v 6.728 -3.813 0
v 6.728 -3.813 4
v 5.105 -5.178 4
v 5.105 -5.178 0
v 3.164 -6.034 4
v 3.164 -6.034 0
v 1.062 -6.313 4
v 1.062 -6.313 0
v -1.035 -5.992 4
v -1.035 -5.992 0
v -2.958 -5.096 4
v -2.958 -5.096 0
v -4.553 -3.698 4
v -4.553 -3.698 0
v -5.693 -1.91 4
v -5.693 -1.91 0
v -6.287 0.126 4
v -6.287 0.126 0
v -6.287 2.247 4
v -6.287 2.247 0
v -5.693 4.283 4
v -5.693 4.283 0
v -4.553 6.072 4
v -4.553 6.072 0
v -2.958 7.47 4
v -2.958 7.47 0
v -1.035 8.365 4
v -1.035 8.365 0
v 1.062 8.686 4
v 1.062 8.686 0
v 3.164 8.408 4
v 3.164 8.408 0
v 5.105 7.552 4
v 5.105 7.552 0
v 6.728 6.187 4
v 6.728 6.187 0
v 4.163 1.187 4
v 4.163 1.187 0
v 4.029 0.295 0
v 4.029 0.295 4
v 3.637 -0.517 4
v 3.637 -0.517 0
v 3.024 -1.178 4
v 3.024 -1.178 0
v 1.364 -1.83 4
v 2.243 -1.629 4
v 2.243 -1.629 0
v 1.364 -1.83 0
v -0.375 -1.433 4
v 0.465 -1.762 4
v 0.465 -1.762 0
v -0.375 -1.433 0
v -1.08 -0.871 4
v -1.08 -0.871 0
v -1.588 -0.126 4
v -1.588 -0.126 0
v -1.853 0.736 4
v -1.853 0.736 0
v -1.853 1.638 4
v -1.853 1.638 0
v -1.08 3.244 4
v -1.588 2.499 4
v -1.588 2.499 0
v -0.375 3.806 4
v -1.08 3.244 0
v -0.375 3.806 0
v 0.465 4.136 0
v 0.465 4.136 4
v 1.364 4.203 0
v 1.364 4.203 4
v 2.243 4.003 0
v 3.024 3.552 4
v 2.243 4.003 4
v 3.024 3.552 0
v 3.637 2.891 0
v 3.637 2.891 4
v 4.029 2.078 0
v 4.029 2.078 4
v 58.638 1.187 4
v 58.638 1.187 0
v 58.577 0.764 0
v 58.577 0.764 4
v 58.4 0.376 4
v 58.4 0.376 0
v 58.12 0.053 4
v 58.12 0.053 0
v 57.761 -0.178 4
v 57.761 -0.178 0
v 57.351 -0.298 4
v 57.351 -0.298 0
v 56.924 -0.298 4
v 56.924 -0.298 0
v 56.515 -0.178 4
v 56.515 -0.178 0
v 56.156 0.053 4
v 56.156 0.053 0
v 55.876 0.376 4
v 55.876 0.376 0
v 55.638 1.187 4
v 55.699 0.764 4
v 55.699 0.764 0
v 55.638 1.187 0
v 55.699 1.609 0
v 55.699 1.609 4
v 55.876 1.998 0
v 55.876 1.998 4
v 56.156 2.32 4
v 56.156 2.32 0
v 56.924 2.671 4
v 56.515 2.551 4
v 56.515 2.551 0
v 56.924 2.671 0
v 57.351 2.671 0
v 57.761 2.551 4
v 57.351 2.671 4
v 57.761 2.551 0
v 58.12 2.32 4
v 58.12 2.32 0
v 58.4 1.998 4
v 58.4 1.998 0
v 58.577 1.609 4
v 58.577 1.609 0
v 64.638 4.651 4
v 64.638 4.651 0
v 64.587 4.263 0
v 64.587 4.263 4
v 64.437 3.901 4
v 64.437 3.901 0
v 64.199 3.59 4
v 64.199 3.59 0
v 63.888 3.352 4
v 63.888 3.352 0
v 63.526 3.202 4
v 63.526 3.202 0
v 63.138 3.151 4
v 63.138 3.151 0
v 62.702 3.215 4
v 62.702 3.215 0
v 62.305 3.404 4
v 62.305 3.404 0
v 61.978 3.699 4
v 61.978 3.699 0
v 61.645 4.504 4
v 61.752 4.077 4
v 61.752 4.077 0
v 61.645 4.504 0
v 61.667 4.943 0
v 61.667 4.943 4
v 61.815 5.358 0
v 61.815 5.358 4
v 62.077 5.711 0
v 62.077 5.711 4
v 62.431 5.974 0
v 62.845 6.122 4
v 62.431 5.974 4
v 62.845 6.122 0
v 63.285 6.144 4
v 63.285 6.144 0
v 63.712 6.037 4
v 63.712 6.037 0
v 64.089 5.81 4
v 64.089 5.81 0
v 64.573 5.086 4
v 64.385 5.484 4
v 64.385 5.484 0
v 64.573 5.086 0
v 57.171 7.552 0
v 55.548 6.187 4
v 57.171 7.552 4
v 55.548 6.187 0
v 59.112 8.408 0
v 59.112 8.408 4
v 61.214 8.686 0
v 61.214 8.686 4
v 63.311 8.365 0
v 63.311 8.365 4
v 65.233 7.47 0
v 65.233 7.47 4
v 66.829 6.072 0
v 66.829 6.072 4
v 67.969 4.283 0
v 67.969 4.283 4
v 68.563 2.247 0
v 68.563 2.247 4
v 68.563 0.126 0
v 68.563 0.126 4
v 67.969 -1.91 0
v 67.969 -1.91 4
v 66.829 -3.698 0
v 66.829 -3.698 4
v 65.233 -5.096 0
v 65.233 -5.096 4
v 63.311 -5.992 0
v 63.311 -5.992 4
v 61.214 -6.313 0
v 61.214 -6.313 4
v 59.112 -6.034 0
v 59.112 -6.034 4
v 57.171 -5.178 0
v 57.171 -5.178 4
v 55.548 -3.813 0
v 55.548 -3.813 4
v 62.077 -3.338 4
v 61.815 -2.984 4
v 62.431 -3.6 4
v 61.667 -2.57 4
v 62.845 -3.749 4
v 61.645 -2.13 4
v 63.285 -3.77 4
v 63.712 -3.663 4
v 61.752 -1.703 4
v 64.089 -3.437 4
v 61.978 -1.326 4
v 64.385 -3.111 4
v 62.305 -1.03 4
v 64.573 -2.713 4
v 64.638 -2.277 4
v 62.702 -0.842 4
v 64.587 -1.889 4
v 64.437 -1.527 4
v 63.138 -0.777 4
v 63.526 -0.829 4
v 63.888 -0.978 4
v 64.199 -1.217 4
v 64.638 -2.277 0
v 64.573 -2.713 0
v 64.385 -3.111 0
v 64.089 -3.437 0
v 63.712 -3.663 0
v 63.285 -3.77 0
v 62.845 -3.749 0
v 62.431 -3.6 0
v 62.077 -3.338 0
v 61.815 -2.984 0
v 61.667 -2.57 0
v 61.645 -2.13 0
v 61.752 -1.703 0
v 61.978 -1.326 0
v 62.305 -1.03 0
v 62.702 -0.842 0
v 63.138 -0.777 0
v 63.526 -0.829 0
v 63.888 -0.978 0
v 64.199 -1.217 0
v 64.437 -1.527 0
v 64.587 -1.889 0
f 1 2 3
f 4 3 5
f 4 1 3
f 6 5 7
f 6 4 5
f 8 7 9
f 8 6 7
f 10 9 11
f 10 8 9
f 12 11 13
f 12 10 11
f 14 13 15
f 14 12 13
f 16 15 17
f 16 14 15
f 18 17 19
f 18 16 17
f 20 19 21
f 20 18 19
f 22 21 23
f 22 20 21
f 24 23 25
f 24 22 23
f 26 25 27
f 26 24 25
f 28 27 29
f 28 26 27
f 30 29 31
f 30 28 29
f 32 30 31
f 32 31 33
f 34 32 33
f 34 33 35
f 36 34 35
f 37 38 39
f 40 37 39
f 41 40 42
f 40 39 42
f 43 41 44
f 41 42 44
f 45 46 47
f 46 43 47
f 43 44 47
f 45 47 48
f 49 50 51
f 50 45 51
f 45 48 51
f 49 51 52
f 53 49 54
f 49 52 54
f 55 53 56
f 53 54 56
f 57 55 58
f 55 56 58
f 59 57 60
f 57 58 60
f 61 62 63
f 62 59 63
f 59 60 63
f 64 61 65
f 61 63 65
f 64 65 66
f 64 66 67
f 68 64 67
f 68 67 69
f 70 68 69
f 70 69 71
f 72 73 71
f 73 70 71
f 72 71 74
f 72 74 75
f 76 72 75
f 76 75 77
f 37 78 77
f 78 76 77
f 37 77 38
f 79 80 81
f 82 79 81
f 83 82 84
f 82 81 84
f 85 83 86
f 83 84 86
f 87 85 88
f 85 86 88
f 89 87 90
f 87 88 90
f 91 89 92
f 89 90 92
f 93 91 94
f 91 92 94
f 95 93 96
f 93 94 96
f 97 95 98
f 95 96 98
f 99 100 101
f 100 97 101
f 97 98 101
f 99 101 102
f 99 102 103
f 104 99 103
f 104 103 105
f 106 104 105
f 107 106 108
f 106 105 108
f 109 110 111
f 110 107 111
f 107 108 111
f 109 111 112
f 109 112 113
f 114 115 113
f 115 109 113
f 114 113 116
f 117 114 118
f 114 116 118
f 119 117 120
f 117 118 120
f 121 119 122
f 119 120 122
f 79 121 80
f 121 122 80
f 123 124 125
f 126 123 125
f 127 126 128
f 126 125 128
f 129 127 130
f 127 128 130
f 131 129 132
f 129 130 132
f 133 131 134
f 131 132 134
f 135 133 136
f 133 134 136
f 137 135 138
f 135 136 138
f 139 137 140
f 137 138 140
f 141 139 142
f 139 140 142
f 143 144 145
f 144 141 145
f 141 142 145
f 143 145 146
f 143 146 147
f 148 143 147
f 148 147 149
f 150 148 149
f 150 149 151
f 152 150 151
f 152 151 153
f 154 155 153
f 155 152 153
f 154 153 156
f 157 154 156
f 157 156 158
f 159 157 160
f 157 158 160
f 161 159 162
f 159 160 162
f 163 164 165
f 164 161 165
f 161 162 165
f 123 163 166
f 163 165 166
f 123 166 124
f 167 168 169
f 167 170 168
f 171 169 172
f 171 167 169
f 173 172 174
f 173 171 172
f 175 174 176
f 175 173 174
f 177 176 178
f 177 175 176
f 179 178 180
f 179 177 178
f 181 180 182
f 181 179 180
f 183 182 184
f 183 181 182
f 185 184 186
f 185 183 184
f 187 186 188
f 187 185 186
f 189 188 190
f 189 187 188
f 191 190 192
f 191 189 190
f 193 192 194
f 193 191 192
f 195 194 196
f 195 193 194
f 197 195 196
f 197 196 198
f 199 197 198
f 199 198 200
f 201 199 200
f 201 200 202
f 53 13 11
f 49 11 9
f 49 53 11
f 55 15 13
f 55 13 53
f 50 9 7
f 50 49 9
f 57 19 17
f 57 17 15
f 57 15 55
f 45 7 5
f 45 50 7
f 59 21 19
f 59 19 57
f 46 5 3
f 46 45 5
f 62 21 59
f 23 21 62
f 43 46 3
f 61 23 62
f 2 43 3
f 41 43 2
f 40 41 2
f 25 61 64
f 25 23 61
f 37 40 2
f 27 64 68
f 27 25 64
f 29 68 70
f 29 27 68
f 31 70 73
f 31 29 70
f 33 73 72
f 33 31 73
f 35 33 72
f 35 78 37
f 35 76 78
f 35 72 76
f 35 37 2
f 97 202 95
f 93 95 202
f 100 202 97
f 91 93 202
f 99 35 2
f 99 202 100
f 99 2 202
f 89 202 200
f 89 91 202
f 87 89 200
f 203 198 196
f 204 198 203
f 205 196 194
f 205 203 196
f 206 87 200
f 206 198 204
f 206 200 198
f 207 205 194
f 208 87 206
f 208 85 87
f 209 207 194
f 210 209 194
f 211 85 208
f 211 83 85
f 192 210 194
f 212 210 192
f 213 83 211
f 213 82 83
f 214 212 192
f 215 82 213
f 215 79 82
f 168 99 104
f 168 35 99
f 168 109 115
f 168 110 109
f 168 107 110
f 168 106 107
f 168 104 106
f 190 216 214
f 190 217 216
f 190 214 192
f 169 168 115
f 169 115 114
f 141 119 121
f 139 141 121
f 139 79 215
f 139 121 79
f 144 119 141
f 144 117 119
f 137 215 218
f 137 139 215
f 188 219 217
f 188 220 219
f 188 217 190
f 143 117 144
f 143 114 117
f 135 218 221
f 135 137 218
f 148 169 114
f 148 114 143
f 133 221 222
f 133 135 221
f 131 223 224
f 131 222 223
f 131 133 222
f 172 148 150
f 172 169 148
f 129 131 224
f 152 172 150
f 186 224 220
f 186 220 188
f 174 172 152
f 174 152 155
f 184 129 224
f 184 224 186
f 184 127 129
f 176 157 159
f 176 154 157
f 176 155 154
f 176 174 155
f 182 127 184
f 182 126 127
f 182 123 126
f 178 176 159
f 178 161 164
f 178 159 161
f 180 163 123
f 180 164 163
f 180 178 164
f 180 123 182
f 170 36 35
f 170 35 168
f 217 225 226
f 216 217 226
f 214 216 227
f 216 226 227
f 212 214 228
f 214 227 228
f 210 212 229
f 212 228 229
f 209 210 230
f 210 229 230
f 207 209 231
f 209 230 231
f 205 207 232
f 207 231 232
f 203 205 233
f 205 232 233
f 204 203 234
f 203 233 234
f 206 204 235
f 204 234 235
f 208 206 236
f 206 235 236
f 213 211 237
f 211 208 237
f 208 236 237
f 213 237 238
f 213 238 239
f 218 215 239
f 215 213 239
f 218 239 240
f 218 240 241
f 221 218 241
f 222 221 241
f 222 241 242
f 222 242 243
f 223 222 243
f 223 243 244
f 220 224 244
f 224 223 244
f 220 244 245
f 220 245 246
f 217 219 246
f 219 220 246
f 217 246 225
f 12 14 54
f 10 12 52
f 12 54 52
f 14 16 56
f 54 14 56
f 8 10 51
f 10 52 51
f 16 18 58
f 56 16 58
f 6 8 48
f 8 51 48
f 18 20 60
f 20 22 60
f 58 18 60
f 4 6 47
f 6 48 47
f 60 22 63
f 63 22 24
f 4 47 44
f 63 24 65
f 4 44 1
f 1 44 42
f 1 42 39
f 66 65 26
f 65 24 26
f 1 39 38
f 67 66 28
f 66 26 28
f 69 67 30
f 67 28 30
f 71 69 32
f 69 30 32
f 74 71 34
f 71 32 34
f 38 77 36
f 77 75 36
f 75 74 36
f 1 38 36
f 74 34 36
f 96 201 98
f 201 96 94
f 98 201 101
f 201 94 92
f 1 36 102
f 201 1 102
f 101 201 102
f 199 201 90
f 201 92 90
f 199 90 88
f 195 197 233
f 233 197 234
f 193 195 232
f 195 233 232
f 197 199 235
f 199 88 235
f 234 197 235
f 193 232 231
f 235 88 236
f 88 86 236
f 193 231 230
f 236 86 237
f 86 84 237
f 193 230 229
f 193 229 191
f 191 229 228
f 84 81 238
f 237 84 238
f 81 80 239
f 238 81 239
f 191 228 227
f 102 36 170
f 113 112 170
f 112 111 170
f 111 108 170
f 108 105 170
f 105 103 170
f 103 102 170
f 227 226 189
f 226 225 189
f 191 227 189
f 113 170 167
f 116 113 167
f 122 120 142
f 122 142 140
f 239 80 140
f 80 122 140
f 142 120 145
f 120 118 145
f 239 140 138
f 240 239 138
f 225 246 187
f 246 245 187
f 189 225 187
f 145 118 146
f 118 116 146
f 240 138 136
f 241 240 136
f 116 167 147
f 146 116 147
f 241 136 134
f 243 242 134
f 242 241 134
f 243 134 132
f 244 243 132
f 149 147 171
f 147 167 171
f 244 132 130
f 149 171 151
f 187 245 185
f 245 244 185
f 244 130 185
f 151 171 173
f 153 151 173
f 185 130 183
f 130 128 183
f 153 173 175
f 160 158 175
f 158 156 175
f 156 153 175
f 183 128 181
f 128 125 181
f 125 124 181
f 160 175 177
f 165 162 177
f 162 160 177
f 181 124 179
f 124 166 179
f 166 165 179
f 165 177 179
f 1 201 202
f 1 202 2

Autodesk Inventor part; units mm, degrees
ref_plane "YZ Plane" through (0, 0, 0) normal (1, 0, 0) x (0, 1, 0)
ref_plane "XZ Plane" through (0, 0, 0) normal (0, 1, 0) x (-1, 0, 0)
ref_plane "XY Plane" through (0, 0, 0) normal (0, 0, 1) x (1, 0, 0)
sketch "スケッチ1" plane through (0, 0, 0) normal (0, 0, 1) x (1, 0, 0)
  arc A0 (2.3922, 20.2558) -> (2.3331, 19.9425) centre (4.2654, 19.7401) ccw
  arc A1 (2.759, 21.2362) -> (2.3922, 20.2558) centre (7.5685, 18.8782) ccw
  arc A2 (3.8916, 23.0137) -> (2.759, 21.2362) centre (11.1286, 17.1527) ccw
  arc A3 (-0.0572, 19.9425) -> (-0.1163, 20.2558) centre (-1.9895, 19.7401) ccw
  arc A4 (-0.1163, 20.2558) -> (-0.4831, 21.2362) centre (-5.2926, 18.8782) ccw
  arc A5 (-0.4831, 21.2362) -> (-1.6157, 23.0137) centre (-8.8527, 17.1527) ccw
  arc A6 (2.2508, 18.6513) -> (0.0251, 18.6513) centre (1.1379, 1.1867) ccw
  arc A7 (-1.6157, 23.0137) -> (-2.9881, 22.7963) centre (1.1379, 1.1867) ccw
  line L0 (2.2508, 18.6513) -> (2.3331, 19.9425)
  line L1 (0.0251, 18.6513) -> (-0.0572, 19.9425)
  line L2 (-5.3173, 17.4526) -> (-5.7946, 18.6552)
  arc A8 (-5.7946, 18.6552) -> (-5.9476, 18.9349) centre (-7.5698, 17.8656) ccw
  arc A9 (-5.9476, 18.9349) -> (-6.5994, 19.754) centre (-10.4448, 16.0252) ccw
  arc A10 (-6.5994, 19.754) -> (-8.2258, 21.0945) centre (-13.2975, 13.284) ccw
  arc A11 (-8.2258, 21.0945) -> (-9.4639, 20.4637) centre (1.1379, 1.1867) ccw
  arc A12 (-3.2005, 18.1404) -> (-5.3173, 17.4526) centre (1.1379, 1.1867) ccw
  line L3 (-3.2005, 18.1404) -> (-3.5213, 19.3939)
  arc A13 (-3.5619, 19.71) -> (-3.5213, 19.3939) centre (-1.621, 19.7985) ccw
  arc A14 (-3.516, 20.7559) -> (-3.5619, 19.71) centre (1.7868, 19.9995) ccw
  arc A15 (-2.9881, 22.7963) -> (-3.516, 20.7559) centre (5.7058, 19.4586) ccw
  line L4 (-10.0278, 14.6617) -> (-10.8533, 15.658)
  arc A16 (-10.8533, 15.658) -> (-11.0853, 15.8767) centre (-12.2977, 14.3585) ccw
  arc A17 (-11.0853, 15.8767) -> (-11.9583, 16.4543) centre (-14.4633, 11.7197) ccw
  arc A18 (-11.9583, 16.4543) -> (-13.9194, 17.2266) centre (-16.3293, 8.2311) ccw
  arc A19 (-13.9194, 17.2266) -> (-14.9019, 16.244) centre (1.1379, 1.1867) ccw
  arc A20 (-8.2272, 15.97) -> (-10.0278, 14.6617) centre (1.1379, 1.1867) ccw
  line L5 (-8.2272, 15.97) -> (-8.9196, 17.063)
  arc A21 (-9.0559, 17.3511) -> (-8.9196, 17.063) centre (-7.2373, 18.035) ccw
  arc A22 (-9.3354, 18.3599) -> (-9.0559, 17.3511) centre (-4.0584, 19.2792) ccw
  arc A23 (-9.4639, 20.4637) -> (-9.3354, 18.3599) centre (-0.164, 19.9759) ccw
  line L6 (-13.6453, 10.5518) -> (-14.7383, 11.2442)
  arc A24 (-14.7383, 11.2442) -> (-15.0265, 11.3805) centre (-15.7104, 9.562) ccw
  arc A25 (-15.0265, 11.3805) -> (-16.0353, 11.6601) centre (-16.9545, 6.3831) ccw
  arc A26 (-16.0353, 11.6601) -> (-18.139, 11.7886) centre (-17.6512, 2.4887) ccw
  arc A27 (-18.139, 11.7886) -> (-18.7698, 10.5505) centre (1.1379, 1.1867) ccw
  arc A28 (-12.3371, 12.3525) -> (-13.6453, 10.5518) centre (1.1379, 1.1867) ccw
  line L7 (-12.3371, 12.3525) -> (-13.3333, 13.178)
  arc A29 (-13.552, 13.4099) -> (-13.3333, 13.178) centre (-12.0338, 14.6223) ccw
  arc A30 (-14.1296, 14.283) -> (-13.552, 13.4099) centre (-9.395, 16.7879) ccw
  arc A31 (-14.9019, 16.244) -> (-14.1296, 14.283) centre (-5.9065, 18.6539) ccw
  line L8 (-15.8158, 5.5252) -> (-17.0692, 5.8459)
  arc A32 (-17.0692, 5.8459) -> (-17.3854, 5.8865) centre (-17.4739, 3.9456) ccw
  arc A33 (-17.3854, 5.8865) -> (-18.4312, 5.8407) centre (-17.6748, 0.5379) ccw
  arc A34 (-18.4312, 5.8407) -> (-20.4717, 5.3128) centre (-17.1339, -3.3812) ccw
  arc A35 (-20.4717, 5.3128) -> (-20.6891, 3.9404) centre (1.1379, 1.1867) ccw
  arc A36 (-15.128, 7.642) -> (-15.8158, 5.5252) centre (1.1379, 1.1867) ccw
  line L9 (-15.128, 7.642) -> (-16.3306, 8.1192)
  arc A37 (-16.6102, 8.2722) -> (-16.3306, 8.1192) centre (-15.541, 9.8944) ccw
  arc A38 (-17.4293, 8.924) -> (-16.6102, 8.2722) centre (-13.7005, 12.7695) ccw
  arc A39 (-18.7698, 10.5505) -> (-17.4293, 8.924) centre (-10.9594, 15.6222) ccw
  line L10 (-16.3266, 0.0739) -> (-17.6179, -0.0084)
  arc A40 (-17.6179, -0.0084) -> (-17.9311, -0.0675) centre (-17.4155, -1.9407) ccw
  arc A41 (-17.9311, -0.0675) -> (-18.9116, -0.4343) centre (-16.5535, -5.2438) ccw
  arc A42 (-18.9116, -0.4343) -> (-20.6891, -1.5669) centre (-14.8281, -8.8039) ccw
  arc A43 (-20.6891, -1.5669) -> (-20.4717, -2.9393) centre (1.1379, 1.1867) ccw
  arc A44 (-16.3266, 2.2996) -> (-16.3266, 0.0739) centre (1.1379, 1.1867) ccw
  line L11 (-16.3266, 2.2996) -> (-17.6179, 2.3819)
  arc A45 (-17.9311, 2.441) -> (-17.6179, 2.3819) centre (-17.4155, 4.3142) ccw
  arc A46 (-18.9116, 2.8078) -> (-17.9311, 2.441) centre (-16.5535, 7.6173) ccw
  arc A47 (-20.6891, 3.9404) -> (-18.9116, 2.8078) centre (-14.8281, 11.1774) ccw
  line L12 (-15.128, -5.2685) -> (-16.3306, -5.7458)
  arc A48 (-16.3306, -5.7458) -> (-16.6102, -5.8988) centre (-15.541, -7.521) ccw
  arc A49 (-16.6102, -5.8988) -> (-17.4293, -6.5506) centre (-13.7005, -10.396) ccw
  arc A50 (-17.4293, -6.5506) -> (-18.7698, -8.177) centre (-10.9594, -13.2487) ccw
  arc A51 (-18.7698, -8.177) -> (-18.139, -9.4151) centre (1.1379, 1.1867) ccw
  arc A52 (-15.8158, -3.1517) -> (-15.128, -5.2685) centre (1.1379, 1.1867) ccw
  line L13 (-15.8158, -3.1517) -> (-17.0692, -3.4725)
  arc A53 (-17.3854, -3.5131) -> (-17.0692, -3.4725) centre (-17.4739, -1.5722) ccw
  arc A54 (-18.4312, -3.4672) -> (-17.3854, -3.5131) centre (-17.6748, 1.8356) ccw
  arc A55 (-20.4717, -2.9393) -> (-18.4312, -3.4672) centre (-17.1339, 5.7546) ccw
  line L14 (-12.3371, -9.979) -> (-13.3333, -10.8046)
  arc A56 (-13.3333, -10.8046) -> (-13.552, -11.0365) centre (-12.0338, -12.2489) ccw
  arc A57 (-13.552, -11.0365) -> (-14.1296, -11.9095) centre (-9.395, -14.4145) ccw
  arc A58 (-14.1296, -11.9095) -> (-14.9019, -13.8706) centre (-5.9065, -16.2805) ccw
  arc A59 (-14.9019, -13.8706) -> (-13.9194, -14.8531) centre (1.1379, 1.1867) ccw
  arc A60 (-13.6453, -8.1784) -> (-12.3371, -9.979) centre (1.1379, 1.1867) ccw
  line L15 (-13.6453, -8.1784) -> (-14.7383, -8.8708)
  arc A61 (-15.0265, -9.0071) -> (-14.7383, -8.8708) centre (-15.7104, -7.1885) ccw
  arc A62 (-16.0353, -9.2866) -> (-15.0265, -9.0071) centre (-16.9545, -4.0097) ccw
  arc A63 (-18.139, -9.4151) -> (-16.0353, -9.2866) centre (-17.6512, -0.1153) ccw
  line L16 (-8.2272, -13.5965) -> (-8.9196, -14.6895)
  arc A64 (-8.9196, -14.6895) -> (-9.0559, -14.9777) centre (-7.2373, -15.6616) ccw
  arc A65 (-9.0559, -14.9777) -> (-9.3354, -15.9865) centre (-4.0584, -16.9058) ccw
  arc A66 (-9.3354, -15.9865) -> (-9.4639, -18.0902) centre (-0.164, -17.6024) ccw
  arc A67 (-9.4639, -18.0902) -> (-8.2258, -18.7211) centre (1.1379, 1.1867) ccw
  arc A68 (-10.0278, -12.2883) -> (-8.2272, -13.5965) centre (1.1379, 1.1867) ccw
  line L17 (-10.0278, -12.2883) -> (-10.8533, -13.2846)
  arc A69 (-11.0853, -13.5032) -> (-10.8533, -13.2846) centre (-12.2977, -11.985) ccw
  arc A70 (-11.9583, -14.0808) -> (-11.0853, -13.5032) centre (-14.4633, -9.3462) ccw
  arc A71 (-13.9194, -14.8531) -> (-11.9583, -14.0808) centre (-16.3293, -5.8577) ccw
  line L18 (-3.2005, -15.767) -> (-3.5213, -17.0204)
  arc A72 (-3.5213, -17.0204) -> (-3.5619, -17.3366) centre (-1.621, -17.4251) ccw
  arc A73 (-3.5619, -17.3366) -> (-3.516, -18.3824) centre (1.7868, -17.626) ccw
  arc A74 (-3.516, -18.3824) -> (-2.9881, -20.4229) centre (5.7058, -17.0851) ccw
  arc A75 (-2.9881, -20.4229) -> (-1.6157, -20.6403) centre (1.1379, 1.1867) ccw
  arc A76 (-5.3173, -15.0792) -> (-3.2005, -15.767) centre (1.1379, 1.1867) ccw
  line L19 (-5.3173, -15.0792) -> (-5.7946, -16.2818)
  arc A77 (-5.9476, -16.5614) -> (-5.7946, -16.2818) centre (-7.5698, -15.4922) ccw
  arc A78 (-6.5994, -17.3806) -> (-5.9476, -16.5614) centre (-10.4448, -13.6517) ccw
  arc A79 (-8.2258, -18.7211) -> (-6.5994, -17.3806) centre (-13.2975, -10.9106) ccw
  line L20 (2.2508, -16.2779) -> (2.3331, -17.5691)
  arc A80 (2.3331, -17.5691) -> (2.3922, -17.8823) centre (4.2654, -17.3667) ccw
  arc A81 (2.3922, -17.8823) -> (2.759, -18.8628) centre (7.5685, -16.5048) ccw
  arc A82 (2.759, -18.8628) -> (3.8916, -20.6403) centre (11.1286, -14.7793) ccw
  arc A83 (3.8916, -20.6403) -> (5.264, -20.4229) centre (1.1379, 1.1867) ccw
  arc A84 (0.0251, -16.2779) -> (2.2508, -16.2779) centre (1.1379, 1.1867) ccw
  line L21 (0.0251, -16.2779) -> (-0.0572, -17.5691)
  arc A85 (-0.1163, -17.8823) -> (-0.0572, -17.5691) centre (-1.9895, -17.3667) ccw
  arc A86 (-0.4831, -18.8628) -> (-0.1163, -17.8823) centre (-5.2926, -16.5048) ccw
  arc A87 (-1.6157, -20.6403) -> (-0.4831, -18.8628) centre (-8.8527, -14.7793) ccw
  line L22 (7.5932, -15.0792) -> (8.0705, -16.2818)
  arc A88 (8.0705, -16.2818) -> (8.2235, -16.5614) centre (9.8457, -15.4922) ccw
  arc A89 (8.2235, -16.5614) -> (8.8753, -17.3806) centre (12.7207, -13.6517) ccw
  arc A90 (8.8753, -17.3806) -> (10.5017, -18.7211) centre (15.5734, -10.9106) ccw
  arc A91 (10.5017, -18.7211) -> (11.7398, -18.0902) centre (1.1379, 1.1867) ccw
  arc A92 (5.4764, -15.767) -> (7.5932, -15.0792) centre (1.1379, 1.1867) ccw
  line L23 (5.4764, -15.767) -> (5.7971, -17.0204)
  arc A93 (5.8377, -17.3366) -> (5.7971, -17.0204) centre (3.8969, -17.4251) ccw
  arc A94 (5.7919, -18.3824) -> (5.8377, -17.3366) centre (0.4891, -17.626) ccw
  arc A95 (5.264, -20.4229) -> (5.7919, -18.3824) centre (-3.43, -17.0851) ccw
  line L24 (12.3037, -12.2883) -> (13.1292, -13.2846)
  arc A96 (13.1292, -13.2846) -> (13.3611, -13.5032) centre (14.5735, -11.985) ccw
  arc A97 (13.3611, -13.5032) -> (14.2342, -14.0808) centre (16.7391, -9.3462) ccw
  arc A98 (14.2342, -14.0808) -> (16.1953, -14.8531) centre (18.6051, -5.8577) ccw
  arc A99 (16.1953, -14.8531) -> (17.1778, -13.8706) centre (1.1379, 1.1867) ccw
  arc A100 (10.503, -13.5965) -> (12.3037, -12.2883) centre (1.1379, 1.1867) ccw
  line L25 (10.503, -13.5965) -> (11.1954, -14.6895)
  arc A101 (11.3317, -14.9777) -> (11.1954, -14.6895) centre (9.5132, -15.6616) ccw
  arc A102 (11.6113, -15.9865) -> (11.3317, -14.9777) centre (6.3343, -16.9058) ccw
  arc A103 (11.7398, -18.0902) -> (11.6113, -15.9865) centre (2.4399, -17.6024) ccw
  line L26 (15.9212, -8.1784) -> (17.0142, -8.8708)
  arc A104 (17.0142, -8.8708) -> (17.3023, -9.0071) centre (17.9862, -7.1885) ccw
  arc A105 (17.3023, -9.0071) -> (18.3111, -9.2866) centre (19.2304, -4.0097) ccw
  arc A106 (18.3111, -9.2866) -> (20.4149, -9.4151) centre (19.9271, -0.1153) ccw
  arc A107 (20.4149, -9.4151) -> (21.0457, -8.177) centre (1.1379, 1.1867) ccw
  arc A108 (14.6129, -9.979) -> (15.9212, -8.1784) centre (1.1379, 1.1867) ccw
  line L27 (14.6129, -9.979) -> (15.6092, -10.8046)
  arc A109 (15.8279, -11.0365) -> (15.6092, -10.8046) centre (14.3097, -12.2489) ccw
  arc A110 (16.4055, -11.9095) -> (15.8279, -11.0365) centre (11.6709, -14.4145) ccw
  arc A111 (17.1778, -13.8706) -> (16.4055, -11.9095) centre (8.1824, -16.2805) ccw
  line L28 (18.0916, -3.1517) -> (19.3451, -3.4725)
  arc A112 (19.3451, -3.4725) -> (19.6613, -3.5131) centre (19.7497, -1.5722) ccw
  arc A113 (19.6613, -3.5131) -> (20.7071, -3.4672) centre (19.9507, 1.8356) ccw
  arc A114 (20.7071, -3.4672) -> (22.7476, -2.9393) centre (19.4098, 5.7546) ccw
  arc A115 (22.7476, -2.9393) -> (22.9649, -1.5669) centre (1.1379, 1.1867) ccw
  arc A116 (17.4038, -5.2685) -> (18.0916, -3.1517) centre (1.1379, 1.1867) ccw
  line L29 (17.4038, -5.2685) -> (18.6065, -5.7458)
  arc A117 (18.8861, -5.8988) -> (18.6065, -5.7458) centre (17.8168, -7.521) ccw
  arc A118 (19.7052, -6.5506) -> (18.8861, -5.8988) centre (15.9764, -10.396) ccw
  arc A119 (21.0457, -8.177) -> (19.7052, -6.5506) centre (13.2352, -13.2487) ccw
  line L30 (18.6025, 2.2996) -> (19.8937, 2.3819)
  arc A120 (19.8937, 2.3819) -> (20.207, 2.441) centre (19.6914, 4.3142) ccw
  arc A121 (20.207, 2.441) -> (21.1874, 2.8078) centre (18.8294, 7.6173) ccw
  arc A122 (21.1874, 2.8078) -> (22.9649, 3.9404) centre (17.104, 11.1774) ccw
  arc A123 (22.9649, 3.9404) -> (22.7476, 5.3128) centre (1.1379, 1.1867) ccw
  arc A124 (18.6025, 0.0739) -> (18.6025, 2.2996) centre (1.1379, 1.1867) ccw
  line L31 (18.6025, 0.0739) -> (19.8937, -0.0084)
  arc A125 (20.207, -0.0675) -> (19.8937, -0.0084) centre (19.6914, -1.9407) ccw
  arc A126 (21.1874, -0.4343) -> (20.207, -0.0675) centre (18.8294, -5.2438) ccw
  arc A127 (22.9649, -1.5669) -> (21.1874, -0.4343) centre (17.104, -8.8039) ccw
  line L32 (17.4038, 7.642) -> (18.6065, 8.1192)
  arc A128 (18.6065, 8.1192) -> (18.8861, 8.2722) centre (17.8168, 9.8944) ccw
  arc A129 (18.8861, 8.2722) -> (19.7052, 8.924) centre (15.9764, 12.7695) ccw
  arc A130 (19.7052, 8.924) -> (21.0457, 10.5505) centre (13.2352, 15.6222) ccw
  arc A131 (21.0457, 10.5505) -> (20.4149, 11.7886) centre (1.1379, 1.1867) ccw
  arc A132 (18.0916, 5.5252) -> (17.4038, 7.642) centre (1.1379, 1.1867) ccw
  line L33 (18.0916, 5.5252) -> (19.3451, 5.8459)
  arc A133 (19.6613, 5.8865) -> (19.3451, 5.8459) centre (19.7497, 3.9456) ccw
  arc A134 (20.7071, 5.8407) -> (19.6613, 5.8865) centre (19.9507, 0.5379) ccw
  arc A135 (22.7476, 5.3128) -> (20.7071, 5.8407) centre (19.4098, -3.3812) ccw
  line L34 (14.6129, 12.3525) -> (15.6092, 13.178)
  arc A136 (15.6092, 13.178) -> (15.8279, 13.4099) centre (14.3097, 14.6223) ccw
  arc A137 (15.8279, 13.4099) -> (16.4055, 14.283) centre (11.6709, 16.7879) ccw
  arc A138 (16.4055, 14.283) -> (17.1778, 16.244) centre (8.1824, 18.6539) ccw
  arc A139 (17.1778, 16.244) -> (16.1953, 17.2266) centre (1.1379, 1.1867) ccw
  arc A140 (15.9212, 10.5518) -> (14.6129, 12.3525) centre (1.1379, 1.1867) ccw
  line L35 (15.9212, 10.5518) -> (17.0142, 11.2442)
  arc A141 (17.3023, 11.3805) -> (17.0142, 11.2442) centre (17.9862, 9.562) ccw
  arc A142 (18.3111, 11.6601) -> (17.3023, 11.3805) centre (19.2304, 6.3831) ccw
  arc A143 (20.4149, 11.7886) -> (18.3111, 11.6601) centre (19.9271, 2.4887) ccw
  line L36 (10.503, 15.97) -> (11.1954, 17.063)
  arc A144 (11.1954, 17.063) -> (11.3317, 17.3511) centre (9.5132, 18.035) ccw
  arc A145 (11.3317, 17.3511) -> (11.6113, 18.3599) centre (6.3343, 19.2792) ccw
  arc A146 (11.6113, 18.3599) -> (11.7398, 20.4637) centre (2.4399, 19.9759) ccw
  arc A147 (11.7398, 20.4637) -> (10.5017, 21.0945) centre (1.1379, 1.1867) ccw
  arc A148 (12.3037, 14.6617) -> (10.503, 15.97) centre (1.1379, 1.1867) ccw
  line L37 (12.3037, 14.6617) -> (13.1292, 15.658)
  arc A149 (13.3611, 15.8767) -> (13.1292, 15.658) centre (14.5735, 14.3585) ccw
  arc A150 (14.2342, 16.4543) -> (13.3611, 15.8767) centre (16.7391, 11.7197) ccw
  arc A151 (16.1953, 17.2266) -> (14.2342, 16.4543) centre (18.6051, 8.2311) ccw
  line L38 (5.4764, 18.1404) -> (5.7971, 19.3939)
  arc A152 (5.7971, 19.3939) -> (5.8377, 19.71) centre (3.8969, 19.7985) ccw
  arc A153 (5.8377, 19.71) -> (5.7919, 20.7559) centre (0.4891, 19.9995) ccw
  arc A154 (5.7919, 20.7559) -> (5.264, 22.7963) centre (-3.43, 19.4586) ccw
  arc A155 (5.264, 22.7963) -> (3.8916, 23.0137) centre (1.1379, 1.1867) ccw
  arc A156 (7.5932, 17.4526) -> (5.4764, 18.1404) centre (1.1379, 1.1867) ccw
  line L39 (7.5932, 17.4526) -> (8.0705, 18.6552)
  arc A157 (8.2235, 18.9349) -> (8.0705, 18.6552) centre (9.8457, 17.8656) ccw
  arc A158 (8.8753, 19.754) -> (8.2235, 18.9349) centre (12.7207, 16.0252) ccw
  arc A159 (10.5017, 21.0945) -> (8.8753, 19.754) centre (15.5734, 13.284) ccw
  circle A160 centre (1.1379, 1.1867) radius 3.025
  line L40 (1.1379, 1.1867) -> (61.1379, 1.1867)
  line L41 (66.1379, -3.8133) -> (-5.7946, -3.8133)
  line L42 (-5.7946, -3.8133) -> (-5.7946, 6.1867)
  line L43 (-5.7946, 6.1867) -> (66.1379, 6.1867)
  line L44 (66.1379, 6.1867) -> (66.1379, -3.8133)
  circle A161 centre (61.1379, 1.1867) radius 7.5
  circle A162 centre (1.1379, 1.1867) radius 7.5
  circle A163 centre (57.1379, 1.1867) radius 1.5
  circle A164 centre (63.1379, -2.2774) radius 1.5
  circle A165 centre (63.1379, 4.6508) radius 1.5
  line L45 (63.1379, -2.2774) -> (63.1379, 4.6508)
  point P0 (0, 0)
  point P1 (-10.0278, -12.2883)
  point P2 (-8.2272, -13.5965)
  point P3 (-8.9196, -14.6895)
  point P4 (-9.0559, -14.9777)
  point P5 (-9.3354, -15.9865)
  point P6 (-9.4639, -18.0902)
  point P7 (-8.2258, -18.7211)
  point P8 (-5.9476, -16.5614)
  point P9 (-5.7946, -16.2818)
  point P10 (-5.3173, -15.0792)
  point P11 (-3.2005, -15.767)
  point P12 (-3.5213, -17.0204)
  point P13 (-3.5619, -17.3366)
  point P14 (-3.516, -18.3824)
  point P15 (-2.9881, -20.4229)
  point P16 (-1.6157, -20.6403)
  point P17 (-0.4831, -18.8628)
  point P18 (-0.1163, -17.8823)
  point P19 (-0.0572, -17.5691)
  point P20 (0.0251, -16.2779)
  point P21 (2.2508, -16.2779)
  point P22 (2.3331, -17.5691)
  point P23 (2.3922, -17.8823)
  point P24 (2.759, -18.8628)
  point P25 (3.8916, -20.6403)
  point P26 (5.264, -20.4229)
  point P27 (5.7919, -18.3824)
  point P28 (5.8377, -17.3366)
  point P29 (5.4764, -15.767)
  point P30 (7.5932, -15.0792)
  point P31 (8.2235, -16.5614)
  point P32 (8.8753, -17.3806)
  point P33 (10.5017, -18.7211)
  point P34 (11.7398, -18.0902)
  point P35 (11.6113, -15.9865)
  point P36 (11.3317, -14.9777)
  point P37 (10.503, -13.5965)
  point P38 (13.3611, -13.5032)
  point P39 (14.2342, -14.0808)
  point P40 (16.1953, -14.8531)
  point P41 (17.1778, -13.8706)
  point P42 (16.4055, -11.9095)
  point P43 (15.8279, -11.0365)
  point P44 (14.6129, -9.979)
  point P45 (17.3023, -9.0071)
  point P46 (18.3111, -9.2866)
  point P47 (20.4149, -9.4151)
  point P48 (21.0457, -8.177)
  point P49 (19.7052, -6.5506)
  point P50 (18.8861, -5.8988)
  point P51 (17.4038, -5.2685)
  point P52 (19.6613, -3.5131)
  point P53 (20.7071, -3.4672)
  point P54 (22.7476, -2.9393)
  point P55 (22.9649, -1.5669)
  point P56 (21.1874, -0.4343)
  point P57 (20.207, -0.0675)
  point P58 (18.6025, 0.0739)
  point P59 (20.207, 2.441)
  point P60 (21.1874, 2.8078)
  point P61 (22.9649, 3.9404)
  point P62 (20.7071, 5.8407)
  point P63 (19.6613, 5.8865)
  point P64 (19.3451, 5.8459)
  point P65 (17.4038, 7.642)
  point P66 (18.6065, 8.1192)
  point P67 (18.8861, 8.2722)
  point P68 (19.7052, 8.924)
  point P69 (21.0457, 10.5505)
  point P70 (20.4149, 11.7886)
  point P71 (18.3111, 11.6601)
  point P72 (17.3023, 11.3805)
  point P73 (15.8279, 13.4099)
  point P74 (16.4055, 14.283)
  point P75 (17.1778, 16.244)
  point P76 (16.1953, 17.2266)
  point P77 (14.2342, 16.4543)
  point P78 (13.3611, 15.8767)
  point P79 (12.3037, 14.6617)
  point P80 (10.503, 15.97)
  point P81 (11.1954, 17.063)
  point P82 (11.3317, 17.3511)
  point P83 (11.6113, 18.3599)
  point P84 (11.7398, 20.4637)
  point P85 (10.5017, 21.0945)
  point P86 (8.8753, 19.754)
  point P87 (8.2235, 18.9349)
  point P88 (8.0705, 18.6552)
  point P89 (5.8377, 19.71)
  point P90 (5.7919, 20.7559)
  point P91 (5.264, 22.7963)
  point P92 (3.8916, 23.0137)
  point P93 (2.759, 21.2362)
  point P94 (2.3922, 20.2558)
  point P95 (-0.1163, 20.2558)
  point P96 (-0.4831, 21.2362)
  point P97 (-1.6157, 23.0137)
  point P98 (-2.9881, 22.7963)
  point P99 (-3.516, 20.7559)
  point P100 (-3.5619, 19.71)
  point P101 (-3.5213, 19.3939)
  point P102 (-3.2005, 18.1404)
  point P103 (-5.3173, 17.4526)
  point P104 (-5.7946, 18.6552)
  point P105 (-5.9476, 18.9349)
  point P106 (-6.5994, 19.754)
  point P107 (-8.2258, 21.0945)
  point P108 (-9.4639, 20.4637)
  point P109 (-9.3354, 18.3599)
  point P110 (-9.0559, 17.3511)
  point P111 (-8.9196, 17.063)
  point P112 (-10.0278, 14.6617)
  point P113 (-10.8533, 15.658)
  point P114 (-11.0853, 15.8767)
  point P115 (-11.9583, 16.4543)
  point P116 (-13.9194, 17.2266)
  point P117 (-14.9019, 16.244)
  point P118 (-14.1296, 14.283)
  point P119 (-13.552, 13.4099)
  point P120 (-14.7383, 11.2442)
  point P121 (-15.0265, 11.3805)
  point P122 (-16.0353, 11.6601)
  point P123 (-18.139, 11.7886)
  point P124 (-18.7698, 10.5505)
  point P125 (-17.4293, 8.924)
  point P126 (-16.6102, 8.2722)
  point P127 (-15.8158, 5.5252)
  point P128 (-17.0692, 5.8459)
  point P129 (-17.3854, 5.8865)
  point P130 (-18.4312, 5.8407)
  point P131 (-20.4717, 5.3128)
  point P132 (-20.6891, 3.9404)
  point P133 (-18.9116, 2.8078)
  point P134 (-17.9311, 2.441)
  point P135 (-17.6179, -0.0084)
  point P136 (-17.9311, -0.0675)
  point P137 (-18.9116, -0.4343)
  point P138 (-20.6891, -1.5669)
  point P139 (-18.4312, -3.4672)
  point P140 (-17.3854, -3.5131)
  point P141 (-15.8158, -3.1517)
  point P142 (-15.128, -5.2685)
  point P143 (-16.3306, -5.7458)
  point P144 (-16.6102, -5.8988)
  point P145 (-17.4293, -6.5506)
  point P146 (-18.7698, -8.177)
  point P147 (-18.139, -9.4151)
  point P148 (-16.0353, -9.2866)
  point P149 (-15.0265, -9.0071)
  point P150 (-14.7383, -8.8708)
  point P151 (-13.6453, -8.1784)
  point P152 (-12.3371, -9.979)
  point P153 (-13.3333, -10.8046)
  point P154 (-13.552, -11.0365)
  point P155 (-14.1296, -11.9095)
  point P156 (-14.9019, -13.8706)
  point P157 (-13.9194, -14.8531)
  point P158 (-11.9583, -14.0808)
  point P159 (-11.0853, -13.5032)
  point P160 (-10.8533, -13.2846)
  point P161 (17.9084, -3.8133)
  point P162 (17.9084, 6.1867)
  point P163 (55.5478, -3.8133)
  point P164 (55.5478, 6.1867)
  point P165 (6.7281, -3.8133)
  point P166 (6.7281, 6.1867)
  dimension "d2" = 360
  dimension "d4" = 6.05
  dimension "d7" = 60
  dimension "d9" = 15
  dimension "d10" = 15
  dimension "d11" = 3
  dimension "d12" = 4
  dimension "d15" = 360
extrude "押し出し1" add sketch "スケッチ1" along normal blind 4 contours L43 A161 L40 A124 L30 A120 A121 A122 A123 A135 A134 A133 L33 A132 | A132 L33 A133 A134 A135 A123 A122 A121 A120 L30 A124 L40 A162 L43 | A162 L41 L42 L43 | L43 A162 | A161 L41 L44 L43 | L43 L44 L41 A161 | L40 A124 L31 A125 A126 A127 A115 A114 A113 A112 L28 A116 L41 A162 | A161 L41 A116 L28 A112 A113 A114 A115 A127 A126 A125 L31 A124 L40 | L42 A162 | A162 L41
properties part number "駆動軸抑え" material "アルミニウム 7075"
